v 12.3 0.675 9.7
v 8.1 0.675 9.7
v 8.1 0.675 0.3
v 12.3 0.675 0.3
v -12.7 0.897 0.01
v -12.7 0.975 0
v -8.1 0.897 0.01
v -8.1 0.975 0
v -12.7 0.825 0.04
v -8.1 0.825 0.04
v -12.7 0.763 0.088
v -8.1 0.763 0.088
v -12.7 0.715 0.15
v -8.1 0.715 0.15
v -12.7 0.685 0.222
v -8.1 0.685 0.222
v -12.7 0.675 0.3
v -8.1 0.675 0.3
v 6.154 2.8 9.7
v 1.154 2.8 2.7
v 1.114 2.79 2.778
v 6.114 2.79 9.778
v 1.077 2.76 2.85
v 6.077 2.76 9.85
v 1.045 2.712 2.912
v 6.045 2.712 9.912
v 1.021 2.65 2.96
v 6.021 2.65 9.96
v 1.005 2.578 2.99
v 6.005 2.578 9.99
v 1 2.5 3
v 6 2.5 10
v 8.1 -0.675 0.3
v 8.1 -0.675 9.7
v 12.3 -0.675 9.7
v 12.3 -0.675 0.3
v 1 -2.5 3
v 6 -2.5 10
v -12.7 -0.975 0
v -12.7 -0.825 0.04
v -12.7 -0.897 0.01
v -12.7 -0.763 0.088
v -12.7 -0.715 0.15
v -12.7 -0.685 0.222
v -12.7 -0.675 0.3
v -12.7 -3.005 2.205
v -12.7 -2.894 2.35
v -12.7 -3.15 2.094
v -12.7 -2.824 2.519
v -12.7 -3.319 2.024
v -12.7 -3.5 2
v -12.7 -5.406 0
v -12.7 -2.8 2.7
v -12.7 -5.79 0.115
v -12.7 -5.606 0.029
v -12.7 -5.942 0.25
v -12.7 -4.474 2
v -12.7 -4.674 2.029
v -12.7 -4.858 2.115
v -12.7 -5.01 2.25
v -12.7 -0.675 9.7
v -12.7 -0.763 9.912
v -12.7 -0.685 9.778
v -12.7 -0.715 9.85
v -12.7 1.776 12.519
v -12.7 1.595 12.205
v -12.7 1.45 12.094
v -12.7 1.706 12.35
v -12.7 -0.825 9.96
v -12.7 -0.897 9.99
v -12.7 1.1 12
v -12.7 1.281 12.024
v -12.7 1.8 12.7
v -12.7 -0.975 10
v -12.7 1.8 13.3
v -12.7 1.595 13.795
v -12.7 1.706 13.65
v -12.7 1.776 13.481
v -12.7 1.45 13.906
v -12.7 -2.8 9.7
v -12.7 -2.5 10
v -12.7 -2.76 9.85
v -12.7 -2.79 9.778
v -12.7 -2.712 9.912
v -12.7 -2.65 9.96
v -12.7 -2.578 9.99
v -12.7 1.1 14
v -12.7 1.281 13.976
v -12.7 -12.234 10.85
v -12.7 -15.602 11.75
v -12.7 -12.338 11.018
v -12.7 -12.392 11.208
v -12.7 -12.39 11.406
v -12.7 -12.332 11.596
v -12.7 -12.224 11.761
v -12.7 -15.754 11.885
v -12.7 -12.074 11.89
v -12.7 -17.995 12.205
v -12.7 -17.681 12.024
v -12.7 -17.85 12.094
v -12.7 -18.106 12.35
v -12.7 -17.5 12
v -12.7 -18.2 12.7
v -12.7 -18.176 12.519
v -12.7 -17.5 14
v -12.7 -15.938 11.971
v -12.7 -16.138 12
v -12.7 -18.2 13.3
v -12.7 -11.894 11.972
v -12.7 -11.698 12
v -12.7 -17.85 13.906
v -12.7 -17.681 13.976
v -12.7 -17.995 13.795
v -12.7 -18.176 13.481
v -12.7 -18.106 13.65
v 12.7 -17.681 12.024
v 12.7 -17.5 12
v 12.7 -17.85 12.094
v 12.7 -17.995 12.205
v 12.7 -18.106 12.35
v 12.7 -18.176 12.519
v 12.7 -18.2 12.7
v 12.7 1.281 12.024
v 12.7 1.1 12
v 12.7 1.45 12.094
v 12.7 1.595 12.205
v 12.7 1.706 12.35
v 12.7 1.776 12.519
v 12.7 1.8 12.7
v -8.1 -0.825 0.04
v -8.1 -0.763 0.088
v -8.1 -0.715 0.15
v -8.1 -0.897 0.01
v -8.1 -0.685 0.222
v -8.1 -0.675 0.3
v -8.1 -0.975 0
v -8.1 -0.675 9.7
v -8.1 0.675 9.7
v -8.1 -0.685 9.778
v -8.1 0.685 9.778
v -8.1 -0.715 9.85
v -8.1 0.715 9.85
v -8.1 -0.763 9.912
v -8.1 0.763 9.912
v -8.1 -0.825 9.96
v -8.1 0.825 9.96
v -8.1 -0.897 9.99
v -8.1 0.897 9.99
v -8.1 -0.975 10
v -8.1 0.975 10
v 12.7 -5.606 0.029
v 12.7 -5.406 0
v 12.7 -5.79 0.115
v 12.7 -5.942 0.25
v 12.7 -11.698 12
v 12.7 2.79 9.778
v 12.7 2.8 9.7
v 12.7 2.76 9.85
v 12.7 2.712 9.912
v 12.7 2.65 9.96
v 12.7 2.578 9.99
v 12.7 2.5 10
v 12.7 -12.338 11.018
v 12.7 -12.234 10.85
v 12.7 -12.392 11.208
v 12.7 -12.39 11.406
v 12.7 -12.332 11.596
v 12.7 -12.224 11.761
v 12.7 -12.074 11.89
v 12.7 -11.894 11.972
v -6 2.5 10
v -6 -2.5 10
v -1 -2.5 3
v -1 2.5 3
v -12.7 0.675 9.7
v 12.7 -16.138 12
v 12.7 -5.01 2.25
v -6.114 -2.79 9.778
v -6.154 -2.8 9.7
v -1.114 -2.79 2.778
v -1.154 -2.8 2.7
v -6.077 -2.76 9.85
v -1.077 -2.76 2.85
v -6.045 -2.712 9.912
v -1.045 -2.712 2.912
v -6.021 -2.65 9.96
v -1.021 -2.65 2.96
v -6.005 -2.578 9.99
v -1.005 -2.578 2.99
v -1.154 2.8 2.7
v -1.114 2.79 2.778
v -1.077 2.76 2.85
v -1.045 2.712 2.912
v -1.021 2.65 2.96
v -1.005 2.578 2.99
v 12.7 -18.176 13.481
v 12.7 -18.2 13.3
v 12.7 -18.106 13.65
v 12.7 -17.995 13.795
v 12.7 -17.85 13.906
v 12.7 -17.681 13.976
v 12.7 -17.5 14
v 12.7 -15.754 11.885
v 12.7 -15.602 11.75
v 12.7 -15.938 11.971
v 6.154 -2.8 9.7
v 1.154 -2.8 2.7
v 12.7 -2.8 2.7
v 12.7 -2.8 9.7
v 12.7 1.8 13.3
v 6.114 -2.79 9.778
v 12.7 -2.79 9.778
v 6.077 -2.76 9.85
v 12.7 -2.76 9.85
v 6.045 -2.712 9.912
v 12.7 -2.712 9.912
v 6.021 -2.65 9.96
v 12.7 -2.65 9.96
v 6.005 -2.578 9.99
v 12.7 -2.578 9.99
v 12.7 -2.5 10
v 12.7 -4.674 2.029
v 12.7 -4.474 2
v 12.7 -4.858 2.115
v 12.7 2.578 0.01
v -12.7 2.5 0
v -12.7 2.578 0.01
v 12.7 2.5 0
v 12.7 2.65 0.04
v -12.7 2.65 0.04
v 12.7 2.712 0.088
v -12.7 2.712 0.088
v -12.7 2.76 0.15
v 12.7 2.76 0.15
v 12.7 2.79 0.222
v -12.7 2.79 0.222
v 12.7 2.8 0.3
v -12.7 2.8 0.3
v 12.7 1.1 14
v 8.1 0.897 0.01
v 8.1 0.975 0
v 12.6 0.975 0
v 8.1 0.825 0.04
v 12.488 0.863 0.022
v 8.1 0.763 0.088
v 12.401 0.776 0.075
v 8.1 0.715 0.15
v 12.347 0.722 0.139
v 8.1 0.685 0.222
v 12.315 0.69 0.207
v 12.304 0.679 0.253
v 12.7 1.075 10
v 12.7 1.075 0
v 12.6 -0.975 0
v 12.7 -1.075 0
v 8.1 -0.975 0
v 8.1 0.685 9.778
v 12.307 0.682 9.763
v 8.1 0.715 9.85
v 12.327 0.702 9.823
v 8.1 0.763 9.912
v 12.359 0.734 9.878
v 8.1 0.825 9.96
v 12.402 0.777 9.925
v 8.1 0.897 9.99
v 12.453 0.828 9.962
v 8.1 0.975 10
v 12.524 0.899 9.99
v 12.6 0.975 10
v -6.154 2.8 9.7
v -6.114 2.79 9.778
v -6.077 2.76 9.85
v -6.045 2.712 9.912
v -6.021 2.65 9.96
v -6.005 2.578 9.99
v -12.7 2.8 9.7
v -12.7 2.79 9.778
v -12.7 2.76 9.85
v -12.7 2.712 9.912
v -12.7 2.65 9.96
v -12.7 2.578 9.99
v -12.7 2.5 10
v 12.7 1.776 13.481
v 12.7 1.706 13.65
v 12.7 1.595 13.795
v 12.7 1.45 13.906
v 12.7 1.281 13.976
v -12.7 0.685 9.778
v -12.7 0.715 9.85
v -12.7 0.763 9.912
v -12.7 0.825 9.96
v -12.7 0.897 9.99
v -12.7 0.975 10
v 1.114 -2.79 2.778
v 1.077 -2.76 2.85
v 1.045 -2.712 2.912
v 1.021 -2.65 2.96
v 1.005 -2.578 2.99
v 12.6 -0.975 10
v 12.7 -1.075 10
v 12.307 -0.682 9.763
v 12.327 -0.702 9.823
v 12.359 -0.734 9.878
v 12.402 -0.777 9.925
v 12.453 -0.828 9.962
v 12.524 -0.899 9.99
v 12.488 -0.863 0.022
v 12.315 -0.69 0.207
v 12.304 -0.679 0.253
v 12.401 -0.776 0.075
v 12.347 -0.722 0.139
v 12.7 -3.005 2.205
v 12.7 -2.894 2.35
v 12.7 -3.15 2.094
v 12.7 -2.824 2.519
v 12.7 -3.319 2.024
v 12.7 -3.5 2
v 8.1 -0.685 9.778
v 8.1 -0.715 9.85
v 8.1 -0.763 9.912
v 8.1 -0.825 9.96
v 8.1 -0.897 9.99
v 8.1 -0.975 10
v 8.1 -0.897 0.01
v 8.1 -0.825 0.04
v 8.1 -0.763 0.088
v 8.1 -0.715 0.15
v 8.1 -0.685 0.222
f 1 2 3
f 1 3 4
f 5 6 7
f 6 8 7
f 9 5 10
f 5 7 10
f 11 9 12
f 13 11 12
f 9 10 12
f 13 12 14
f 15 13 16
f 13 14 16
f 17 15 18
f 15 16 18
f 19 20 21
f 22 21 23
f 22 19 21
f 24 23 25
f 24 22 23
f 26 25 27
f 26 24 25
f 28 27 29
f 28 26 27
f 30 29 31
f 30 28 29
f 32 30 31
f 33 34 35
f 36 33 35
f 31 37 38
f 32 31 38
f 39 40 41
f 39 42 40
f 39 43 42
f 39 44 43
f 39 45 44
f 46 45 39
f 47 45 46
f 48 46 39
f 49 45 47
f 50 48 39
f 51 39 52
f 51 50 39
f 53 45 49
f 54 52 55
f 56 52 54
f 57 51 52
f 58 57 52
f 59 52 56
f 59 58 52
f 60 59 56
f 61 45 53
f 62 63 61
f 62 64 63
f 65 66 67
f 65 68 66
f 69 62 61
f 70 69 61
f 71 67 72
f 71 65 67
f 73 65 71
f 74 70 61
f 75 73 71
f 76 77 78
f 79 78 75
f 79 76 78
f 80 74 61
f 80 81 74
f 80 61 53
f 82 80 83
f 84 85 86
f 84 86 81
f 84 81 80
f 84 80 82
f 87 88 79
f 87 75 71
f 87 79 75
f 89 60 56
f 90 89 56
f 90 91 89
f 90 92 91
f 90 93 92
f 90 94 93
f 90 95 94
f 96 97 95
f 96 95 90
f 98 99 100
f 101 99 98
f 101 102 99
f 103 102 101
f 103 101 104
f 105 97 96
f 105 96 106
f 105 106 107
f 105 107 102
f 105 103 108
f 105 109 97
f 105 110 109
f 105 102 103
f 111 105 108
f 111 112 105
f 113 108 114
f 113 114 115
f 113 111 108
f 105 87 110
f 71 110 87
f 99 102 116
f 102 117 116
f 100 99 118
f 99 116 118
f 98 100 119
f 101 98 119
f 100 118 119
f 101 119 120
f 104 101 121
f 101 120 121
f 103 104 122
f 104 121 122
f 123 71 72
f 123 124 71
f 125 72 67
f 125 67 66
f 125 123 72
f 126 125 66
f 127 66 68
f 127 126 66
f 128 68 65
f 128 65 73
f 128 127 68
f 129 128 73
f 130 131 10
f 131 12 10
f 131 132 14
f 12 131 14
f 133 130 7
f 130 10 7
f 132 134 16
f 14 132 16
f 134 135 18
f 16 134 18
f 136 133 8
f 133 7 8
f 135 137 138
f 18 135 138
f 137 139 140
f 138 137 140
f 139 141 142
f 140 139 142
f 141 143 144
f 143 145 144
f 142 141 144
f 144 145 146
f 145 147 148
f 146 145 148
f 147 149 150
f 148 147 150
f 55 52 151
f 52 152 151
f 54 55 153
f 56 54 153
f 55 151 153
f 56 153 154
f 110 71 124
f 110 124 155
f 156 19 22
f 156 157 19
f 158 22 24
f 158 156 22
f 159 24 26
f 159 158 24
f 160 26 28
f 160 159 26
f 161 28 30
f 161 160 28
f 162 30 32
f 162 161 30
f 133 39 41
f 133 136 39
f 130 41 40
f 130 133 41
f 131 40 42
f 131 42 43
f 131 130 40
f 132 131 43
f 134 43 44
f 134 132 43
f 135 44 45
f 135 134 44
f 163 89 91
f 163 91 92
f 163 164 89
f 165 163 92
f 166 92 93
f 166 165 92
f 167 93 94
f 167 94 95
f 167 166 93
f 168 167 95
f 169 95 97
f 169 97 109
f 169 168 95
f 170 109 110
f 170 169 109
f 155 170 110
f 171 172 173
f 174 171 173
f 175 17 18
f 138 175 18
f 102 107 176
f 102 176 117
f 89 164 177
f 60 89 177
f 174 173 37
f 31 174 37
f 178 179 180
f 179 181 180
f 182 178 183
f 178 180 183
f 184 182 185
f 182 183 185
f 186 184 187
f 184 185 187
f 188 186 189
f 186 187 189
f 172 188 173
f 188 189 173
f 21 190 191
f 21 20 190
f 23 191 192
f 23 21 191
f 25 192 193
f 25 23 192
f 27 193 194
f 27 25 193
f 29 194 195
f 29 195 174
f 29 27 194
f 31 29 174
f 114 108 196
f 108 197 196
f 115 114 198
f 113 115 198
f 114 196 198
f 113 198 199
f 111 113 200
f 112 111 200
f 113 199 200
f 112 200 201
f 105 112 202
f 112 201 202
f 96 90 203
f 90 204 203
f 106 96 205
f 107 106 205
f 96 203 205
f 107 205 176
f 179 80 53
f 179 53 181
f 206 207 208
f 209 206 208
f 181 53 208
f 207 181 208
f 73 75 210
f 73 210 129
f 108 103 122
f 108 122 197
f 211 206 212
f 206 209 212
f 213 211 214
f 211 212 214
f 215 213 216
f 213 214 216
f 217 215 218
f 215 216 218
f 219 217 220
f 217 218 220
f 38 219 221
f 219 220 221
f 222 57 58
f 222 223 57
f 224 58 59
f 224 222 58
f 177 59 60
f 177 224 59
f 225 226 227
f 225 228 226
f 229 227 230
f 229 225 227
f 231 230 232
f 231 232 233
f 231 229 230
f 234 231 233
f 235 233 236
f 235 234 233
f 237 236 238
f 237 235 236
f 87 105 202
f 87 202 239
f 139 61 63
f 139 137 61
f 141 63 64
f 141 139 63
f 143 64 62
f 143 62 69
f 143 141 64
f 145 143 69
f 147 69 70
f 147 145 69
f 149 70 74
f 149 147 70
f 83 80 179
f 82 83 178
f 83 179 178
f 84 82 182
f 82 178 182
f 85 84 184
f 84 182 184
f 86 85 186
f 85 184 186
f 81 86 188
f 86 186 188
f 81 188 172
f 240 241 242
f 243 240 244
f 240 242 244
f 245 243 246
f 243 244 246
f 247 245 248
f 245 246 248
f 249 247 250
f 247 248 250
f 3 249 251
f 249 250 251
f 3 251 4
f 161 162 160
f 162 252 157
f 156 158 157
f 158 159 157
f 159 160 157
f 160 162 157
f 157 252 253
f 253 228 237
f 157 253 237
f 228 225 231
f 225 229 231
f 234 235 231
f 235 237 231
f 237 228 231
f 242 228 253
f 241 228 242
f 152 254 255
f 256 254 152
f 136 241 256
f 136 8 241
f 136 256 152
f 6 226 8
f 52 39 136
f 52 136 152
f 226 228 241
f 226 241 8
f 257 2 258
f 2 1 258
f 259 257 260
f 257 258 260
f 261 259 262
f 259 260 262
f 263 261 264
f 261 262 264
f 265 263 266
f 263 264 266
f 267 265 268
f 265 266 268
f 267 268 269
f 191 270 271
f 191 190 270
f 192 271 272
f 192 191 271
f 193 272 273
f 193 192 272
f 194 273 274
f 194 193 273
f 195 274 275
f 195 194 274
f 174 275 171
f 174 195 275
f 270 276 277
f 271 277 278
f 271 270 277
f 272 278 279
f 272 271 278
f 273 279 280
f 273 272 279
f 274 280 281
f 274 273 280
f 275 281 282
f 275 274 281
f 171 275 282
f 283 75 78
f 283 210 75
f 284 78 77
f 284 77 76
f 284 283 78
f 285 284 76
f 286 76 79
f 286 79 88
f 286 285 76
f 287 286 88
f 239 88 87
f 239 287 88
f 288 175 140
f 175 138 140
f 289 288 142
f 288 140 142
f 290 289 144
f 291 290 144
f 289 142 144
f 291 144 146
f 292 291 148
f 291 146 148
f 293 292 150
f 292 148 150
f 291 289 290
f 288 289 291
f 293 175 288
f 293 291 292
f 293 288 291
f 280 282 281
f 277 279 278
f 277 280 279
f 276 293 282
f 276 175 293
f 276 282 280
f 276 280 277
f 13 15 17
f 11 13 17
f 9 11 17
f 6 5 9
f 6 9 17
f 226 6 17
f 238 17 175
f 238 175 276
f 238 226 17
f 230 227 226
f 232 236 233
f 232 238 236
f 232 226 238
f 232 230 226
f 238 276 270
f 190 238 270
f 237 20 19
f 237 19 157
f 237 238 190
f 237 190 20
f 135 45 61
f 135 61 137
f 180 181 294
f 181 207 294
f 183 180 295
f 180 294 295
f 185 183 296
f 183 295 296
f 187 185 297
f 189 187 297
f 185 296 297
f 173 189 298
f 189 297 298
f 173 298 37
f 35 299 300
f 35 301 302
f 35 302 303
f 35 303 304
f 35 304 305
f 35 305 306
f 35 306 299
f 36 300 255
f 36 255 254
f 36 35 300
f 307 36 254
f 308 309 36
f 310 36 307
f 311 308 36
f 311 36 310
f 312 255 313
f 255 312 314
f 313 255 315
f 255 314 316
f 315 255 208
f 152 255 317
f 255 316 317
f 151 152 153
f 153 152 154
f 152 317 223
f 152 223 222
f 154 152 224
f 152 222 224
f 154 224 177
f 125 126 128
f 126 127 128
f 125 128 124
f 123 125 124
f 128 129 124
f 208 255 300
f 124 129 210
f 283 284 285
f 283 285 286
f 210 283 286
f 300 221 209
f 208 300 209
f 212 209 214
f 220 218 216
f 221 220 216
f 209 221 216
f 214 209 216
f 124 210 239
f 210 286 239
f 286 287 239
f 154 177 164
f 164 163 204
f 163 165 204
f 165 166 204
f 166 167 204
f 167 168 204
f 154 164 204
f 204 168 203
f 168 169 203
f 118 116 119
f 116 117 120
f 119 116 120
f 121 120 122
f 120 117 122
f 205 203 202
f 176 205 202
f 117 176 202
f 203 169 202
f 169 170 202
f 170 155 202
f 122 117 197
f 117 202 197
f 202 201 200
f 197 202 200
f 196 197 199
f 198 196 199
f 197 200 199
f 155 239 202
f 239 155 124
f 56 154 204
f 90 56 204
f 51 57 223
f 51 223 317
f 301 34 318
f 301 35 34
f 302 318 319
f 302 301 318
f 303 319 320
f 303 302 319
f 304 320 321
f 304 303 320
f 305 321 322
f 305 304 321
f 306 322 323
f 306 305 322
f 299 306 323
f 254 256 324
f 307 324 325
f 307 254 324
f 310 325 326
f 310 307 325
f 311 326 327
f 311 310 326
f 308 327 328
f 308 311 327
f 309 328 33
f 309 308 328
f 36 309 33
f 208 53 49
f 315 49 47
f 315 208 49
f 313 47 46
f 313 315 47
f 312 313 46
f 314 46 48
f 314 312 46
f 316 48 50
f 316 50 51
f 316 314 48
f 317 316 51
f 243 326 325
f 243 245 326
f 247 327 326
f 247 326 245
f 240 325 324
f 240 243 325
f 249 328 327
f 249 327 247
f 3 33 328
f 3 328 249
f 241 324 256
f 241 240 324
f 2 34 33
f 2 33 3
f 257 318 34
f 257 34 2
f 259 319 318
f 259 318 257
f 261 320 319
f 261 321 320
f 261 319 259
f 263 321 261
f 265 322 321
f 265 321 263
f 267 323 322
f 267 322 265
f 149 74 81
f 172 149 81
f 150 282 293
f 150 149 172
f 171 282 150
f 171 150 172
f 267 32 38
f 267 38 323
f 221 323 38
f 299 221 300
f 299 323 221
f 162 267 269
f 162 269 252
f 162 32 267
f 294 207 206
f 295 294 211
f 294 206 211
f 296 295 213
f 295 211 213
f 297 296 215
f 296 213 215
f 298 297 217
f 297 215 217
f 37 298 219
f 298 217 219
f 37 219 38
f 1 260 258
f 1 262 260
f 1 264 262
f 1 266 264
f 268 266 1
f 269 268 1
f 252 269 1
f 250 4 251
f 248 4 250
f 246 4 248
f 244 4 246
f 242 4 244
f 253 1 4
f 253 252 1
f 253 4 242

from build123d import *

# Parameters (mm, degrees)
F0_W     = 25.4
F0_H     = 5.6
F1_DEPTH = 10
F2_W     = 4.6
F2_H     = 1.35
F3_DEPTH = 10
F5_DEPTH = 5.6
F7_DEPTH = 25.4
F8_SIZE  = 0.4
F9_R     = 0.7
F10_R    = 0.29999


# Not quite as in the source:
# - a fillet or chamfer is up to 0.001 mm smaller than in the source, because OpenCascade refuses the exact size


with BuildPart() as f1:
    # F0 (on Top) → F1 (new body)
    with BuildSketch(Plane.XY):
        Rectangle(F0_W, F0_H)
    extrude(amount=F1_DEPTH)

    # F2 (on face) → F3 (cut, through all)
    with BuildSketch(Plane.XY.offset(10)):
        with Locations((-10.4, 0)):
            Rectangle(F2_W, F2_H)
        with Locations((10.4, 0)):
            Rectangle(F2_W, F2_H)
    extrude(amount=-F3_DEPTH, mode=Mode.SUBTRACT)

    # F4 (on face) → F5 (cut, through all)
    with BuildSketch(Plane.XZ.offset(2.8)):
        Polygon((6, 10), (-6, 10), (-1, 3), (1, 3), align=None)
    extrude(amount=-F5_DEPTH, mode=Mode.SUBTRACT)

    # F6 (on face) → F7 (join, through all)
    with BuildSketch(Plane(origin=(-12.7, 0, 0), x_dir=(0, -1, 0), z_dir=(-1, 0, 0))):
        Polygon((2.8, 2), (2.8, 0), (5.7319724348, 0), (15.8119724348, 12), (18.2, 12), (18.2, 14), (-1.8, 14), (-1.8, 12), (13.2, 12), (4.8, 2), align=None)
    extrude(amount=-F7_DEPTH)

    # F8
    f8_edges = [f1.edges().sort_by_distance(p)[0] for p in [
        (12.7, 0.675, 5),
        (12.7, -0.675, 5),
    ]]
    chamfer(f8_edges, length=F8_SIZE)

    # F9
    f9_edges = [f1.edges().sort_by_distance(p)[0] for p in [
        (0, -2.8, 2),
        (0, -4.8, 2),
        (0, -13.2, 12),
        (0, -15.811972, 12),
        (0, -5.731972, 0),
        (0, -18.2, 12),
        (0, -18.2, 14),
        (0, 1.8, 12),
        (0, 1.8, 14),
    ]]
    fillet(f9_edges, radius=F9_R)

    # F10 (radius 0.3 in the source; OpenCascade refuses exactly that, so slightly less here)
    f10_edges = [f1.edges().sort_by_distance(p)[0] for p in [
        (0, 2.8, 0),
        (9.35, 2.8, 10),
        (-9.35, 2.8, 10),
        (-10.4, 0.675, 0),
        (10.2, 0.675, 0),
        (10.2, -0.675, 0),
        (-10.4, -0.675, 0),
        (10.2, 0.675, 10),
        (10.2, -0.675, 10),
        (9.35, -2.8, 10),
        (-10.4, 0.675, 10),
        (-10.4, -0.675, 10),
        (-9.35, -2.8, 10),
        (3.5, 2.8, 6.5),
        (0, 2.8, 3),
        (-3.5, 2.8, 6.5),
        (0, -2.8, 3),
        (3.5, -2.8, 6.5),
        (-3.5, -2.8, 6.5),
    ]]
    fillet(f10_edges, radius=F10_R)


solid = f1.part
